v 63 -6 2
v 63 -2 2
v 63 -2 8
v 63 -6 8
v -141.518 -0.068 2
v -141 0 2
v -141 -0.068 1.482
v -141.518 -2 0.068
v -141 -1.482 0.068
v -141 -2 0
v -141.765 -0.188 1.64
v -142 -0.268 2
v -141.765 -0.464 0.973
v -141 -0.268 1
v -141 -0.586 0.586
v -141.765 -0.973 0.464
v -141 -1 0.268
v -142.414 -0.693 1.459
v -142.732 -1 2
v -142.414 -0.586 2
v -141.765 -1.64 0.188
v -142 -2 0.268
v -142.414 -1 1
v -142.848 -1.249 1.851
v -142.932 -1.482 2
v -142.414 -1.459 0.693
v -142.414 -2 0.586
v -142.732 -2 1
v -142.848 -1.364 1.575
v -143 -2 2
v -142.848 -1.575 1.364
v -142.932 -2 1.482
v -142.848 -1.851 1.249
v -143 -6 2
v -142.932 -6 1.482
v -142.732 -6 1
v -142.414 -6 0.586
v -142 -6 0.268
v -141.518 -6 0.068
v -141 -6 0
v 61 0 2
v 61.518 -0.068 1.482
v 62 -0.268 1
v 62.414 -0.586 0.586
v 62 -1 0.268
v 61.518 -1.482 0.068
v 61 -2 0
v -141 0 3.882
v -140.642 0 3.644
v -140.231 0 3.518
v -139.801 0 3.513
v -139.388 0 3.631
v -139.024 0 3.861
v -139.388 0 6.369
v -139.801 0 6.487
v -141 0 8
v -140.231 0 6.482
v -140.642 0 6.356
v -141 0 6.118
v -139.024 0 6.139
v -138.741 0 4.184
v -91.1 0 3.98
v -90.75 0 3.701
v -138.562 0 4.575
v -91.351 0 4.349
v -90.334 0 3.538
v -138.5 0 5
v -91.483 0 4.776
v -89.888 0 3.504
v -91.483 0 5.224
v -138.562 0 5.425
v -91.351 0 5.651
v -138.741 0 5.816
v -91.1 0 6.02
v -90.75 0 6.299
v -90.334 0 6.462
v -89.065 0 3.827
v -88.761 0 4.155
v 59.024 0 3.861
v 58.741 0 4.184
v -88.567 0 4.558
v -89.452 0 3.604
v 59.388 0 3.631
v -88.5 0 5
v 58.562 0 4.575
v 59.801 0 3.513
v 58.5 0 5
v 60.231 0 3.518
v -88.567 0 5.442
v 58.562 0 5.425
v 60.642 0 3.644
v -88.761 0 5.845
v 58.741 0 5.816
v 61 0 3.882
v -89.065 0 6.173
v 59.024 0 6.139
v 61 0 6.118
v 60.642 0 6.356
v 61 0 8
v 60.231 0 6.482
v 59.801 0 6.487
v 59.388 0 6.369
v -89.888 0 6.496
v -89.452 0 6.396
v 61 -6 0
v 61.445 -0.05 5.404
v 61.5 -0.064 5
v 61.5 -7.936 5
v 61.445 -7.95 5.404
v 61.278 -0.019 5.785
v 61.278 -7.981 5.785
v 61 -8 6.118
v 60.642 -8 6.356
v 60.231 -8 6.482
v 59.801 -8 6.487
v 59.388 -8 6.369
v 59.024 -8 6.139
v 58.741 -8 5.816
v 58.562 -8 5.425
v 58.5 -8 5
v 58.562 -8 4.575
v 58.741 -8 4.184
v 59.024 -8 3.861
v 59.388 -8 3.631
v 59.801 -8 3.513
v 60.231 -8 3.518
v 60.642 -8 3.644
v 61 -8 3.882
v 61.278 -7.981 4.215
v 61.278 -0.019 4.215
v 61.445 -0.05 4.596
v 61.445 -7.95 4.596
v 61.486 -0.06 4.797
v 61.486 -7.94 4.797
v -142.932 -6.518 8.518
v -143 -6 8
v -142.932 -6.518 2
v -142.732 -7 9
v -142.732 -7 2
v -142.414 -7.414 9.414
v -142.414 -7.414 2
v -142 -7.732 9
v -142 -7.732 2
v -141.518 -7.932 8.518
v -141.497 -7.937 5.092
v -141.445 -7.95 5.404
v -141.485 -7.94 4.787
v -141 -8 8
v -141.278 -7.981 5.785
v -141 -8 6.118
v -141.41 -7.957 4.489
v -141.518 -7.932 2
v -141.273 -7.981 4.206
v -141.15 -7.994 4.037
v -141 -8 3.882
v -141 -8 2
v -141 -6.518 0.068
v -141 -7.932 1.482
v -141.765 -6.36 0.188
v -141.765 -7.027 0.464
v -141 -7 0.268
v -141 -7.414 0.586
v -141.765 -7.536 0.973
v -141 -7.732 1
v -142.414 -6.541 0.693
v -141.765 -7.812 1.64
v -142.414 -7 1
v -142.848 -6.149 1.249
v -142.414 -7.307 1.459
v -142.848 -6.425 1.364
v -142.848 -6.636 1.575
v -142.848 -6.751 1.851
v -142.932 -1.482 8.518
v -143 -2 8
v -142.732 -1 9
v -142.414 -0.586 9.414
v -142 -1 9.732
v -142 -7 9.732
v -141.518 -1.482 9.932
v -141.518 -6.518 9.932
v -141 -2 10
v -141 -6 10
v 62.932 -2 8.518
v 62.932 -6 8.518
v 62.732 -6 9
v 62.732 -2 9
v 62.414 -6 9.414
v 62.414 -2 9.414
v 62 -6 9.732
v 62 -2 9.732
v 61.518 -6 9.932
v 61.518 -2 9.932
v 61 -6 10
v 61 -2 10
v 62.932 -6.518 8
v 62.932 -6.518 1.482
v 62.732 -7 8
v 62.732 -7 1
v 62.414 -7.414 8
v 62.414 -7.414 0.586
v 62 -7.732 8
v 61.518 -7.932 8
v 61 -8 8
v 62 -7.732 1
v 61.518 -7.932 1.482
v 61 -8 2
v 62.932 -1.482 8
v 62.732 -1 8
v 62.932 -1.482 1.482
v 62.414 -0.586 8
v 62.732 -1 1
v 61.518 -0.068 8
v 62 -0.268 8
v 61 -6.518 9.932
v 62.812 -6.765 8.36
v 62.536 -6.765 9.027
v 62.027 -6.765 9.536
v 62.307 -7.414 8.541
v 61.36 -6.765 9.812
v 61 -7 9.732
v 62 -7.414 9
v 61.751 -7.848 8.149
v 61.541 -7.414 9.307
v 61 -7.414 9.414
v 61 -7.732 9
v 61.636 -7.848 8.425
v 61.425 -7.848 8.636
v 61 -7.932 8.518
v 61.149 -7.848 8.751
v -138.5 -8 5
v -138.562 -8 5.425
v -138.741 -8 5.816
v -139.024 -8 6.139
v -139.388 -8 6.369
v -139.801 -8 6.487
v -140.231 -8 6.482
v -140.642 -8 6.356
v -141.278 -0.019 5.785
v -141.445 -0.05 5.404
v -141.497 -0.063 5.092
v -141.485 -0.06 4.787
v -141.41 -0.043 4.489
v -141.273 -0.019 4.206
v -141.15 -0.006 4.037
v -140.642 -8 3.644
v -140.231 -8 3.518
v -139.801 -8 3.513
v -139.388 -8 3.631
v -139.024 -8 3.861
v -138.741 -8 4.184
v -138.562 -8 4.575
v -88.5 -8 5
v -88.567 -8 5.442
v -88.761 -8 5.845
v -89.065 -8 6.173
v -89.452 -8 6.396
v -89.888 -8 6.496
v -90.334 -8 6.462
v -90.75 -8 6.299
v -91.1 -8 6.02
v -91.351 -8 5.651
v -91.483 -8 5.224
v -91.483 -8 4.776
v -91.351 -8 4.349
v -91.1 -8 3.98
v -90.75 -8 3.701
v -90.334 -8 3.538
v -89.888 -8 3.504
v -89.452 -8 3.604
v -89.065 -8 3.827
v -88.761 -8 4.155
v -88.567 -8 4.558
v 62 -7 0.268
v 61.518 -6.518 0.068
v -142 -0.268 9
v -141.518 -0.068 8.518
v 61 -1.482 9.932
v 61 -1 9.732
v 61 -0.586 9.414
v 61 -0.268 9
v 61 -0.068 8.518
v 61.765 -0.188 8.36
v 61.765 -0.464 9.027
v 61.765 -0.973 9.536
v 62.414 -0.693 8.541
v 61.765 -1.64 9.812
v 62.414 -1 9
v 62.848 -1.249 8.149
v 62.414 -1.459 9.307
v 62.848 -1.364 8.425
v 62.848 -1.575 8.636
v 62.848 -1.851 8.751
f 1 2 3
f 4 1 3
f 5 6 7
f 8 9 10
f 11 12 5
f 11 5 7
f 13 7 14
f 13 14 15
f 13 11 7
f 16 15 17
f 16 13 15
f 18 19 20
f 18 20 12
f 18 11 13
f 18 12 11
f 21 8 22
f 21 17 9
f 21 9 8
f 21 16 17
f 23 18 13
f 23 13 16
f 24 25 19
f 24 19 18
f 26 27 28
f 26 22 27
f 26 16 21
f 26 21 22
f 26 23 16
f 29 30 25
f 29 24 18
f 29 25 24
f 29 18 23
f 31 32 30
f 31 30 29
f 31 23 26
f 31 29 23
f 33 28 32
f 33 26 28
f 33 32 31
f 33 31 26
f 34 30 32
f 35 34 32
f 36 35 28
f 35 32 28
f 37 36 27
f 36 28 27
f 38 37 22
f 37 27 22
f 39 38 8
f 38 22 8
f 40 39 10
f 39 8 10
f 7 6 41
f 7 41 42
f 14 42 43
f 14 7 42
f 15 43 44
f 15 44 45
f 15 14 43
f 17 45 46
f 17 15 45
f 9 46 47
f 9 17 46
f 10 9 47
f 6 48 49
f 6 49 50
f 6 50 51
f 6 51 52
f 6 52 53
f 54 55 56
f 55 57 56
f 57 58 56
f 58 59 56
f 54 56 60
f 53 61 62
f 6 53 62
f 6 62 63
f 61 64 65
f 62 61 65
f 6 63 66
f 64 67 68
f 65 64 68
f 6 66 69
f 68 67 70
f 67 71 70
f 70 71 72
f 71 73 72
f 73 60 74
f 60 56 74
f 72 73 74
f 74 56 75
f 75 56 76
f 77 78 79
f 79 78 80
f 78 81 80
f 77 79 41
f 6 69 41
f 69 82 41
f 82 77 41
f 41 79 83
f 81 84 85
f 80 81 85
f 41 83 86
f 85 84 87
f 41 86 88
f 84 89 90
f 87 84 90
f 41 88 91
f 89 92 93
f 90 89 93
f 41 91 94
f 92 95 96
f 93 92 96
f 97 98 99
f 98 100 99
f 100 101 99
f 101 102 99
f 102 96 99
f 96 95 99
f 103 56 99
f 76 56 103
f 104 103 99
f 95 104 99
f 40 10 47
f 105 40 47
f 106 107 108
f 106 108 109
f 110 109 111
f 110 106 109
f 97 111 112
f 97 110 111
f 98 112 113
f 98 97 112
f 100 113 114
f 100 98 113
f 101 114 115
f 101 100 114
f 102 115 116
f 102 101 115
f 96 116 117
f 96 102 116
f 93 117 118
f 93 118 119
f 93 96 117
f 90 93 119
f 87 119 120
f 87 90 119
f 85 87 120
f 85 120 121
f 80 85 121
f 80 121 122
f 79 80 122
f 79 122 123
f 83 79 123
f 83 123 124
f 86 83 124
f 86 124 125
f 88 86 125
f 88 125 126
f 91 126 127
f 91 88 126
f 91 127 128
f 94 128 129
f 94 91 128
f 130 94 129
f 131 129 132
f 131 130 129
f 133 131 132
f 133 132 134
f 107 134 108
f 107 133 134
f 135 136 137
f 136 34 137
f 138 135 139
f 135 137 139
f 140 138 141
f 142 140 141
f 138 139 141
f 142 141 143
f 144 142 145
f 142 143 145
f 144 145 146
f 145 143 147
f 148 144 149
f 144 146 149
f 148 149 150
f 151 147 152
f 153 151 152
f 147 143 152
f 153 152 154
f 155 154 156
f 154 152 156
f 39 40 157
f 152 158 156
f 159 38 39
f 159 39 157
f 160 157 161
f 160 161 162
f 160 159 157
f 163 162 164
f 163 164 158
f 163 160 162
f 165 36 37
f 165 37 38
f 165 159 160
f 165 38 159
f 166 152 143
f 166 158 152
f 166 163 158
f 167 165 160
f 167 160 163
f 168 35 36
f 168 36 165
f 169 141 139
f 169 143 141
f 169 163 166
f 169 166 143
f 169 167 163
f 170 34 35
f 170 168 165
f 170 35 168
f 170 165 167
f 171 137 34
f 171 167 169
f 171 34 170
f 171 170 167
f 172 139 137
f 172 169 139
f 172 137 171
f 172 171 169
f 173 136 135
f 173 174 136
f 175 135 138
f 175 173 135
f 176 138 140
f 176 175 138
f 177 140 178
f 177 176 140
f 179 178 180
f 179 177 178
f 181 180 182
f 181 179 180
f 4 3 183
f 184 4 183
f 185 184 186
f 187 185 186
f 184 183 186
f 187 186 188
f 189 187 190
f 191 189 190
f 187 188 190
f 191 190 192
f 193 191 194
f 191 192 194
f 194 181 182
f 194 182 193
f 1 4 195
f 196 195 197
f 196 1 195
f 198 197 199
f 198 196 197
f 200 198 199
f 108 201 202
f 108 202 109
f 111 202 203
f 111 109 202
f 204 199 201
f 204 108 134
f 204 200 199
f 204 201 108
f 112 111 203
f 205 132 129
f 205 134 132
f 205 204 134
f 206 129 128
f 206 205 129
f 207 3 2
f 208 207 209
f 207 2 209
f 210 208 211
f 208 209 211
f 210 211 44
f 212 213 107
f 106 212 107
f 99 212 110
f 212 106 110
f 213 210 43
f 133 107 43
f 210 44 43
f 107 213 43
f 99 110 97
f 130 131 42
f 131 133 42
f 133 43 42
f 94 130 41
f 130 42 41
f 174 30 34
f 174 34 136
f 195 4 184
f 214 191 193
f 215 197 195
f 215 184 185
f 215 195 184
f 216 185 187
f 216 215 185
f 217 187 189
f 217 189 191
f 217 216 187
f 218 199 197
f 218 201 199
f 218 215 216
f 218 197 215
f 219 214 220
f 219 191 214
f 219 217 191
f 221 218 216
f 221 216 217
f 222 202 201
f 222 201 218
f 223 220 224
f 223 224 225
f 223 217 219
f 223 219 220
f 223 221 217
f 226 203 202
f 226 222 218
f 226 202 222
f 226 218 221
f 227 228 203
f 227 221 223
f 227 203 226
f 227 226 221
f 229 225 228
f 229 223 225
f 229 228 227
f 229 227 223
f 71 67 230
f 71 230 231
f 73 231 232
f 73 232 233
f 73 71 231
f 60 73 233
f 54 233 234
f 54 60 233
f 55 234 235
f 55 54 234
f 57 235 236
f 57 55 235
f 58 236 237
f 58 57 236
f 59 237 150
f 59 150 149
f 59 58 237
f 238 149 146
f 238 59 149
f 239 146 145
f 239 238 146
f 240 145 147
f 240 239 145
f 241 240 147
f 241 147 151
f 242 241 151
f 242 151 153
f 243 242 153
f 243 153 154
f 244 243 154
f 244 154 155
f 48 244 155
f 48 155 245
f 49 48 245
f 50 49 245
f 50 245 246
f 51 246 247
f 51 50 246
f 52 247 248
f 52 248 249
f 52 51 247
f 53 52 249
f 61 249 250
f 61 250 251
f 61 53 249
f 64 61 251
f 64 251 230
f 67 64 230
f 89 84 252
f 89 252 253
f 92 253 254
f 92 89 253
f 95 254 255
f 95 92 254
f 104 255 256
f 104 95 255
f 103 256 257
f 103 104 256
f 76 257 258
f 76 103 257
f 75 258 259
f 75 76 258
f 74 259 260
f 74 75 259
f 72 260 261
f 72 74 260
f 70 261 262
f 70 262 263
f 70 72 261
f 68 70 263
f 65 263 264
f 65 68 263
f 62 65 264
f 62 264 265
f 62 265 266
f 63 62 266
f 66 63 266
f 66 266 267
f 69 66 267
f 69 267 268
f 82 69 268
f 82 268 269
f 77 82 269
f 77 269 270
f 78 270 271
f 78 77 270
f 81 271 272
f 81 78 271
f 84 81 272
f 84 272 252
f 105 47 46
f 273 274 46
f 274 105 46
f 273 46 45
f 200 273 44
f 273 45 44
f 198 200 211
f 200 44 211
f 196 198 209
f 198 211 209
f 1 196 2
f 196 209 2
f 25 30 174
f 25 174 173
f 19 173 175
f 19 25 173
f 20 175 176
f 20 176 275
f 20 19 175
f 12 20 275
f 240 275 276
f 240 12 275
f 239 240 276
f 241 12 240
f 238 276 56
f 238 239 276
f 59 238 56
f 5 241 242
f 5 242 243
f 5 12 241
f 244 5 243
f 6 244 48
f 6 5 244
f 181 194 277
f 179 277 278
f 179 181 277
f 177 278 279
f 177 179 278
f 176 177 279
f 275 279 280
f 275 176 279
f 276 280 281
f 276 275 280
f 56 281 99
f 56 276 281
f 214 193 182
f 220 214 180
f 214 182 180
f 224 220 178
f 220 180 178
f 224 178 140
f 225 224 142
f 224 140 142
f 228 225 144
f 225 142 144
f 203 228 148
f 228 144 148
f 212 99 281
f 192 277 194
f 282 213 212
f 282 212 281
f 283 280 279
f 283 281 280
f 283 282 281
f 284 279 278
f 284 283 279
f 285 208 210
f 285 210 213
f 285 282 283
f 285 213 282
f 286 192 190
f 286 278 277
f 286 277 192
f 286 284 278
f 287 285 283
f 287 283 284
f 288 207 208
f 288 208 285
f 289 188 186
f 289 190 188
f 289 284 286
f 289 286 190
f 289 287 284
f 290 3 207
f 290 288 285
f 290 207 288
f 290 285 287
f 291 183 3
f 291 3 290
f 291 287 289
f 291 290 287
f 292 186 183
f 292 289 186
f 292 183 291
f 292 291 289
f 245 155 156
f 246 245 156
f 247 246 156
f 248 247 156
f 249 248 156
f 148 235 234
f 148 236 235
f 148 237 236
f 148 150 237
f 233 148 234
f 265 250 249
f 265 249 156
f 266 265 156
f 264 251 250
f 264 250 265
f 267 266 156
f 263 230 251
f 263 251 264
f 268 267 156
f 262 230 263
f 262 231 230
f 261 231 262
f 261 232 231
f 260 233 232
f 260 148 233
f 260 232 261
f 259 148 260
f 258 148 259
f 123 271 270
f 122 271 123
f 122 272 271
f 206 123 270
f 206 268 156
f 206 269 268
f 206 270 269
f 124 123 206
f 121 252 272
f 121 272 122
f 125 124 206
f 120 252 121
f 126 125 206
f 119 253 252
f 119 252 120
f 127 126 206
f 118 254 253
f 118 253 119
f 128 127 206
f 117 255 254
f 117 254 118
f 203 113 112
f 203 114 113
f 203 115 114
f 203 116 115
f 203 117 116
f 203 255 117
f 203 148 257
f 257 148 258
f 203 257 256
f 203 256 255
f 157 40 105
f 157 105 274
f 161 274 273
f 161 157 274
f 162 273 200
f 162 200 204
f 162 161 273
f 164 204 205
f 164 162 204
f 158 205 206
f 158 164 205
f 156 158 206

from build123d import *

# Parameters (mm, degrees)
F0_W         = 206
F0_H         = 10
F0_R         = 1.5
F1_DEPTH     = 8
F2_T1_DEPTH  = 4
F2_T3_DEPTH  = 18
F2_T5_DEPTH  = 209
F2_T7_DEPTH  = 13
F2_S11_W     = 2
F2_S11_H     = 2
F2_T12_DEPTH = 2
F2_S17_W     = 2
F2_S17_H     = 2
F2_T18_DEPTH = 2
F3_T1_DEPTH  = 11
F3_T3_DEPTH  = 4
F3_T5_DEPTH  = 207
F3_S9_W      = 2.04
F3_S9_H      = 2.04
F3_T10_DEPTH = 2.04
F3_S15_W     = 2.04
F3_S15_H     = 2.04
F3_T16_DEPTH = 2.04


# Not quite as in the source:
# - a fillet or chamfer that OpenCascade refuses, or shapes differently, is made with other operations: its cross-section is extruded or revolved along the edge and cut away or added


with BuildPart() as f1:
    # F0 (on Front) → F1 (new body)
    with BuildSketch(Plane.XZ):
        with Locations((-40, 5)):
            Rectangle(F0_W, F0_H)
        with Locations((-140, 5)):
            Circle(F0_R, mode=Mode.SUBTRACT)
        with Locations((-90, 5)):
            Circle(F0_R, mode=Mode.SUBTRACT)
        with Locations((60, 5)):
            Circle(F0_R, mode=Mode.SUBTRACT)
    extrude(amount=F1_DEPTH)

    # F2: fillet of radius 2 on 7 edges, made by hand

    # F2_s2 → F2_t1 (cut)
    with BuildSketch(Plane.XZ.offset(2)):
        with BuildLine():
            ThreePointArc((63, 8), (62.4142135624, 9.4142135624), (61, 10))
            Line((61, 10), (63, 10))
            Line((63, 10), (63, 8))
        make_face()
    extrude(amount=F2_T1_DEPTH, mode=Mode.SUBTRACT)

    # F2_s4 → F2_t3 (cut)
    with BuildSketch(Plane.XZ.offset(-5)):
        with BuildLine():
            ThreePointArc((-143, 8), (-142.4142135624, 9.4142135624), (-141, 10))
            Line((-141, 10), (-143, 10))
            Line((-143, 10), (-143, 8))
        make_face()
        with BuildLine():
            ThreePointArc((61, 0), (62.4142135624, 0.5857864376), (63, 2))
            Line((63, 2), (63, 0))
            Line((63, 0), (61, 0))
        make_face()
    extrude(amount=F2_T3_DEPTH, mode=Mode.SUBTRACT)

    # F2_s6 → F2_t5 (cut)
    with BuildSketch(Plane.YZ.offset(-148)):
        with BuildLine():
            ThreePointArc((-2, 10), (-0.5857864376, 9.4142135624), (0, 8))
            Line((0, 8), (0, 10))
            Line((0, 10), (-2, 10))
        make_face()
        with BuildLine():
            ThreePointArc((-6, 10), (-7.4142135624, 9.4142135624), (-8, 8))
            Line((-8, 8), (-8, 10))
            Line((-8, 10), (-6, 10))
        make_face()
    extrude(amount=F2_T5_DEPTH, mode=Mode.SUBTRACT)

    # F2_s8 → F2_t7 (cut)
    with BuildSketch(Plane.XY.offset(-5)):
        with BuildLine():
            ThreePointArc((63, -2), (62.4142135624, -0.5857864376), (61, 0))
            Line((61, 0), (63, 0))
            Line((63, 0), (63, -2))
        make_face()
        with BuildLine():
            ThreePointArc((63, -6), (62.4142135624, -7.4142135624), (61, -8))
            Line((61, -8), (63, -8))
            Line((63, -8), (63, -6))
        make_face()
    extrude(amount=F2_T7_DEPTH, mode=Mode.SUBTRACT)


with BuildPart() as f2_tool10:
    # F2_s11 → F2_t12 (new body)
    with BuildSketch(Plane.YZ.offset(61)):
        with Locations((-1, 9)):
            Rectangle(F2_S11_W, F2_S11_H)
    extrude(amount=F2_T12_DEPTH)

    # F2_s13 → F2_t14 (revolve, cut)
    with BuildSketch(Plane(origin=(61, -2, 8), x_dir=(0, -0.7071067812, -0.7071067812), z_dir=(0, -0.7071067812, 0.7071067812))):
        with BuildLine():
            ThreePointArc((0, -2), (2, 0), (0, 2))
            Line((0, 2), (0, -2))
        make_face()
    revolve(axis=Axis((61, -2, 8), (1, 0, 0)), mode=Mode.SUBTRACT)


with BuildPart() as f1_1:
    add(f1.part)

    # F2_t9: cut F2_tool10
    add(f2_tool10.part, mode=Mode.SUBTRACT)


with BuildPart() as f2_tool16:
    # F2_s17 → F2_t18 (new body)
    with BuildSketch(Plane.XZ.offset(6)):
        with Locations((62, 9)):
            Rectangle(F2_S17_W, F2_S17_H)
    extrude(amount=F2_T18_DEPTH)

    # F2_s19 → F2_t20 (revolve, cut)
    with BuildSketch(Plane(origin=(61, -6, 8), x_dir=(-0.7071067812, 0, -0.7071067812), z_dir=(-0.7071067812, 0, 0.7071067812))):
        with BuildLine():
            ThreePointArc((0, -2), (2, 0), (0, 2))
            Line((0, 2), (0, -2))
        make_face()
    revolve(axis=Axis((61, -6, 8), (0, -1, 0)), mode=Mode.SUBTRACT)


with BuildPart() as f1_2:
    add(f1_1.part)

    # F2_t15: cut F2_tool16
    add(f2_tool16.part, mode=Mode.SUBTRACT)

    # F3: fillet of radius 2 on 7 edges, made by hand

    # F3_s2 → F3_t1 (cut)
    with BuildSketch(Plane.XY.offset(2)):
        with BuildLine():
            ThreePointArc((-143, -2), (-142.4142135624, -0.5857864376), (-141, 0))
            Line((-141, 0), (-143, 0))
            Line((-143, 0), (-143, -2))
        make_face()
        with BuildLine():
            ThreePointArc((-143, -6), (-142.4142135624, -7.4142135624), (-141, -8))
            Line((-141, -8), (-143, -8))
            Line((-143, -8), (-143, -6))
        make_face()
    extrude(amount=F3_T1_DEPTH, mode=Mode.SUBTRACT)

    # F3_s4 → F3_t3 (cut)
    with BuildSketch(Plane.XZ.offset(2)):
        with BuildLine():
            ThreePointArc((-143, 2), (-142.4142135624, 0.5857864376), (-141, 0))
            Line((-141, 0), (-143, 0))
            Line((-143, 0), (-143, 2))
        make_face()
    extrude(amount=F3_T3_DEPTH, mode=Mode.SUBTRACT)

    # F3_s6 → F3_t5 (cut)
    with BuildSketch(Plane.YZ.offset(-141)):
        with BuildLine():
            ThreePointArc((0, 2), (-0.5857864376, 0.5857864376), (-2, 0))
            Line((-2, 0), (0, 0))
            Line((0, 0), (0, 2))
        make_face()
        with BuildLine():
            ThreePointArc((-6, 0), (-7.4142135624, 0.5857864376), (-8, 2))
            Line((-8, 2), (-8, 0))
            Line((-8, 0), (-6, 0))
        make_face()
    extrude(amount=F3_T5_DEPTH, mode=Mode.SUBTRACT)


with BuildPart() as f3_tool8:
    # F3_s9 → F3_t10 (new body)
    with BuildSketch(Plane.YZ.offset(-141)):
        with Locations((-0.98, 0.98)):
            Rectangle(F3_S9_W, F3_S9_H)
    extrude(amount=-F3_T10_DEPTH)

    # F3_s11 → F3_t12 (revolve, cut)
    with BuildSketch(Plane(origin=(-141, -2, 2), x_dir=(0, -0.7071067812, 0.7071067812), z_dir=(0, -0.7071067812, -0.7071067812))):
        with BuildLine():
            ThreePointArc((0, -2), (2, 0), (0, 2))
            Line((0, 2), (0, -2))
        make_face()
    revolve(axis=Axis((-141, -2, 2), (-1, 0, 0)), mode=Mode.SUBTRACT)


with BuildPart() as f1_3:
    add(f1_2.part)

    # F3_t7: cut F3_tool8
    add(f3_tool8.part, mode=Mode.SUBTRACT)


with BuildPart() as f3_tool14:
    # F3_s15 → F3_t16 (new body)
    with BuildSketch(Plane.YZ.offset(-141)):
        with Locations((-7.02, 0.98)):
            Rectangle(F3_S15_W, F3_S15_H)
    extrude(amount=-F3_T16_DEPTH)

    # F3_s17 → F3_t18 (revolve, cut)
    with BuildSketch(Plane(origin=(-141, -6, 2), x_dir=(0, 0.7071067812, 0.7071067812), z_dir=(0, -0.7071067812, 0.7071067812))):
        with BuildLine():
            ThreePointArc((0, -2), (2, 0), (0, 2))
            Line((0, 2), (0, -2))
        make_face()
    revolve(axis=Axis((-141, -6, 2), (-1, 0, 0)), mode=Mode.SUBTRACT)


with BuildPart() as f1_4:
    add(f1_3.part)

    # F3_t13: cut F3_tool14
    add(f3_tool14.part, mode=Mode.SUBTRACT)


solid = f1_4.part
